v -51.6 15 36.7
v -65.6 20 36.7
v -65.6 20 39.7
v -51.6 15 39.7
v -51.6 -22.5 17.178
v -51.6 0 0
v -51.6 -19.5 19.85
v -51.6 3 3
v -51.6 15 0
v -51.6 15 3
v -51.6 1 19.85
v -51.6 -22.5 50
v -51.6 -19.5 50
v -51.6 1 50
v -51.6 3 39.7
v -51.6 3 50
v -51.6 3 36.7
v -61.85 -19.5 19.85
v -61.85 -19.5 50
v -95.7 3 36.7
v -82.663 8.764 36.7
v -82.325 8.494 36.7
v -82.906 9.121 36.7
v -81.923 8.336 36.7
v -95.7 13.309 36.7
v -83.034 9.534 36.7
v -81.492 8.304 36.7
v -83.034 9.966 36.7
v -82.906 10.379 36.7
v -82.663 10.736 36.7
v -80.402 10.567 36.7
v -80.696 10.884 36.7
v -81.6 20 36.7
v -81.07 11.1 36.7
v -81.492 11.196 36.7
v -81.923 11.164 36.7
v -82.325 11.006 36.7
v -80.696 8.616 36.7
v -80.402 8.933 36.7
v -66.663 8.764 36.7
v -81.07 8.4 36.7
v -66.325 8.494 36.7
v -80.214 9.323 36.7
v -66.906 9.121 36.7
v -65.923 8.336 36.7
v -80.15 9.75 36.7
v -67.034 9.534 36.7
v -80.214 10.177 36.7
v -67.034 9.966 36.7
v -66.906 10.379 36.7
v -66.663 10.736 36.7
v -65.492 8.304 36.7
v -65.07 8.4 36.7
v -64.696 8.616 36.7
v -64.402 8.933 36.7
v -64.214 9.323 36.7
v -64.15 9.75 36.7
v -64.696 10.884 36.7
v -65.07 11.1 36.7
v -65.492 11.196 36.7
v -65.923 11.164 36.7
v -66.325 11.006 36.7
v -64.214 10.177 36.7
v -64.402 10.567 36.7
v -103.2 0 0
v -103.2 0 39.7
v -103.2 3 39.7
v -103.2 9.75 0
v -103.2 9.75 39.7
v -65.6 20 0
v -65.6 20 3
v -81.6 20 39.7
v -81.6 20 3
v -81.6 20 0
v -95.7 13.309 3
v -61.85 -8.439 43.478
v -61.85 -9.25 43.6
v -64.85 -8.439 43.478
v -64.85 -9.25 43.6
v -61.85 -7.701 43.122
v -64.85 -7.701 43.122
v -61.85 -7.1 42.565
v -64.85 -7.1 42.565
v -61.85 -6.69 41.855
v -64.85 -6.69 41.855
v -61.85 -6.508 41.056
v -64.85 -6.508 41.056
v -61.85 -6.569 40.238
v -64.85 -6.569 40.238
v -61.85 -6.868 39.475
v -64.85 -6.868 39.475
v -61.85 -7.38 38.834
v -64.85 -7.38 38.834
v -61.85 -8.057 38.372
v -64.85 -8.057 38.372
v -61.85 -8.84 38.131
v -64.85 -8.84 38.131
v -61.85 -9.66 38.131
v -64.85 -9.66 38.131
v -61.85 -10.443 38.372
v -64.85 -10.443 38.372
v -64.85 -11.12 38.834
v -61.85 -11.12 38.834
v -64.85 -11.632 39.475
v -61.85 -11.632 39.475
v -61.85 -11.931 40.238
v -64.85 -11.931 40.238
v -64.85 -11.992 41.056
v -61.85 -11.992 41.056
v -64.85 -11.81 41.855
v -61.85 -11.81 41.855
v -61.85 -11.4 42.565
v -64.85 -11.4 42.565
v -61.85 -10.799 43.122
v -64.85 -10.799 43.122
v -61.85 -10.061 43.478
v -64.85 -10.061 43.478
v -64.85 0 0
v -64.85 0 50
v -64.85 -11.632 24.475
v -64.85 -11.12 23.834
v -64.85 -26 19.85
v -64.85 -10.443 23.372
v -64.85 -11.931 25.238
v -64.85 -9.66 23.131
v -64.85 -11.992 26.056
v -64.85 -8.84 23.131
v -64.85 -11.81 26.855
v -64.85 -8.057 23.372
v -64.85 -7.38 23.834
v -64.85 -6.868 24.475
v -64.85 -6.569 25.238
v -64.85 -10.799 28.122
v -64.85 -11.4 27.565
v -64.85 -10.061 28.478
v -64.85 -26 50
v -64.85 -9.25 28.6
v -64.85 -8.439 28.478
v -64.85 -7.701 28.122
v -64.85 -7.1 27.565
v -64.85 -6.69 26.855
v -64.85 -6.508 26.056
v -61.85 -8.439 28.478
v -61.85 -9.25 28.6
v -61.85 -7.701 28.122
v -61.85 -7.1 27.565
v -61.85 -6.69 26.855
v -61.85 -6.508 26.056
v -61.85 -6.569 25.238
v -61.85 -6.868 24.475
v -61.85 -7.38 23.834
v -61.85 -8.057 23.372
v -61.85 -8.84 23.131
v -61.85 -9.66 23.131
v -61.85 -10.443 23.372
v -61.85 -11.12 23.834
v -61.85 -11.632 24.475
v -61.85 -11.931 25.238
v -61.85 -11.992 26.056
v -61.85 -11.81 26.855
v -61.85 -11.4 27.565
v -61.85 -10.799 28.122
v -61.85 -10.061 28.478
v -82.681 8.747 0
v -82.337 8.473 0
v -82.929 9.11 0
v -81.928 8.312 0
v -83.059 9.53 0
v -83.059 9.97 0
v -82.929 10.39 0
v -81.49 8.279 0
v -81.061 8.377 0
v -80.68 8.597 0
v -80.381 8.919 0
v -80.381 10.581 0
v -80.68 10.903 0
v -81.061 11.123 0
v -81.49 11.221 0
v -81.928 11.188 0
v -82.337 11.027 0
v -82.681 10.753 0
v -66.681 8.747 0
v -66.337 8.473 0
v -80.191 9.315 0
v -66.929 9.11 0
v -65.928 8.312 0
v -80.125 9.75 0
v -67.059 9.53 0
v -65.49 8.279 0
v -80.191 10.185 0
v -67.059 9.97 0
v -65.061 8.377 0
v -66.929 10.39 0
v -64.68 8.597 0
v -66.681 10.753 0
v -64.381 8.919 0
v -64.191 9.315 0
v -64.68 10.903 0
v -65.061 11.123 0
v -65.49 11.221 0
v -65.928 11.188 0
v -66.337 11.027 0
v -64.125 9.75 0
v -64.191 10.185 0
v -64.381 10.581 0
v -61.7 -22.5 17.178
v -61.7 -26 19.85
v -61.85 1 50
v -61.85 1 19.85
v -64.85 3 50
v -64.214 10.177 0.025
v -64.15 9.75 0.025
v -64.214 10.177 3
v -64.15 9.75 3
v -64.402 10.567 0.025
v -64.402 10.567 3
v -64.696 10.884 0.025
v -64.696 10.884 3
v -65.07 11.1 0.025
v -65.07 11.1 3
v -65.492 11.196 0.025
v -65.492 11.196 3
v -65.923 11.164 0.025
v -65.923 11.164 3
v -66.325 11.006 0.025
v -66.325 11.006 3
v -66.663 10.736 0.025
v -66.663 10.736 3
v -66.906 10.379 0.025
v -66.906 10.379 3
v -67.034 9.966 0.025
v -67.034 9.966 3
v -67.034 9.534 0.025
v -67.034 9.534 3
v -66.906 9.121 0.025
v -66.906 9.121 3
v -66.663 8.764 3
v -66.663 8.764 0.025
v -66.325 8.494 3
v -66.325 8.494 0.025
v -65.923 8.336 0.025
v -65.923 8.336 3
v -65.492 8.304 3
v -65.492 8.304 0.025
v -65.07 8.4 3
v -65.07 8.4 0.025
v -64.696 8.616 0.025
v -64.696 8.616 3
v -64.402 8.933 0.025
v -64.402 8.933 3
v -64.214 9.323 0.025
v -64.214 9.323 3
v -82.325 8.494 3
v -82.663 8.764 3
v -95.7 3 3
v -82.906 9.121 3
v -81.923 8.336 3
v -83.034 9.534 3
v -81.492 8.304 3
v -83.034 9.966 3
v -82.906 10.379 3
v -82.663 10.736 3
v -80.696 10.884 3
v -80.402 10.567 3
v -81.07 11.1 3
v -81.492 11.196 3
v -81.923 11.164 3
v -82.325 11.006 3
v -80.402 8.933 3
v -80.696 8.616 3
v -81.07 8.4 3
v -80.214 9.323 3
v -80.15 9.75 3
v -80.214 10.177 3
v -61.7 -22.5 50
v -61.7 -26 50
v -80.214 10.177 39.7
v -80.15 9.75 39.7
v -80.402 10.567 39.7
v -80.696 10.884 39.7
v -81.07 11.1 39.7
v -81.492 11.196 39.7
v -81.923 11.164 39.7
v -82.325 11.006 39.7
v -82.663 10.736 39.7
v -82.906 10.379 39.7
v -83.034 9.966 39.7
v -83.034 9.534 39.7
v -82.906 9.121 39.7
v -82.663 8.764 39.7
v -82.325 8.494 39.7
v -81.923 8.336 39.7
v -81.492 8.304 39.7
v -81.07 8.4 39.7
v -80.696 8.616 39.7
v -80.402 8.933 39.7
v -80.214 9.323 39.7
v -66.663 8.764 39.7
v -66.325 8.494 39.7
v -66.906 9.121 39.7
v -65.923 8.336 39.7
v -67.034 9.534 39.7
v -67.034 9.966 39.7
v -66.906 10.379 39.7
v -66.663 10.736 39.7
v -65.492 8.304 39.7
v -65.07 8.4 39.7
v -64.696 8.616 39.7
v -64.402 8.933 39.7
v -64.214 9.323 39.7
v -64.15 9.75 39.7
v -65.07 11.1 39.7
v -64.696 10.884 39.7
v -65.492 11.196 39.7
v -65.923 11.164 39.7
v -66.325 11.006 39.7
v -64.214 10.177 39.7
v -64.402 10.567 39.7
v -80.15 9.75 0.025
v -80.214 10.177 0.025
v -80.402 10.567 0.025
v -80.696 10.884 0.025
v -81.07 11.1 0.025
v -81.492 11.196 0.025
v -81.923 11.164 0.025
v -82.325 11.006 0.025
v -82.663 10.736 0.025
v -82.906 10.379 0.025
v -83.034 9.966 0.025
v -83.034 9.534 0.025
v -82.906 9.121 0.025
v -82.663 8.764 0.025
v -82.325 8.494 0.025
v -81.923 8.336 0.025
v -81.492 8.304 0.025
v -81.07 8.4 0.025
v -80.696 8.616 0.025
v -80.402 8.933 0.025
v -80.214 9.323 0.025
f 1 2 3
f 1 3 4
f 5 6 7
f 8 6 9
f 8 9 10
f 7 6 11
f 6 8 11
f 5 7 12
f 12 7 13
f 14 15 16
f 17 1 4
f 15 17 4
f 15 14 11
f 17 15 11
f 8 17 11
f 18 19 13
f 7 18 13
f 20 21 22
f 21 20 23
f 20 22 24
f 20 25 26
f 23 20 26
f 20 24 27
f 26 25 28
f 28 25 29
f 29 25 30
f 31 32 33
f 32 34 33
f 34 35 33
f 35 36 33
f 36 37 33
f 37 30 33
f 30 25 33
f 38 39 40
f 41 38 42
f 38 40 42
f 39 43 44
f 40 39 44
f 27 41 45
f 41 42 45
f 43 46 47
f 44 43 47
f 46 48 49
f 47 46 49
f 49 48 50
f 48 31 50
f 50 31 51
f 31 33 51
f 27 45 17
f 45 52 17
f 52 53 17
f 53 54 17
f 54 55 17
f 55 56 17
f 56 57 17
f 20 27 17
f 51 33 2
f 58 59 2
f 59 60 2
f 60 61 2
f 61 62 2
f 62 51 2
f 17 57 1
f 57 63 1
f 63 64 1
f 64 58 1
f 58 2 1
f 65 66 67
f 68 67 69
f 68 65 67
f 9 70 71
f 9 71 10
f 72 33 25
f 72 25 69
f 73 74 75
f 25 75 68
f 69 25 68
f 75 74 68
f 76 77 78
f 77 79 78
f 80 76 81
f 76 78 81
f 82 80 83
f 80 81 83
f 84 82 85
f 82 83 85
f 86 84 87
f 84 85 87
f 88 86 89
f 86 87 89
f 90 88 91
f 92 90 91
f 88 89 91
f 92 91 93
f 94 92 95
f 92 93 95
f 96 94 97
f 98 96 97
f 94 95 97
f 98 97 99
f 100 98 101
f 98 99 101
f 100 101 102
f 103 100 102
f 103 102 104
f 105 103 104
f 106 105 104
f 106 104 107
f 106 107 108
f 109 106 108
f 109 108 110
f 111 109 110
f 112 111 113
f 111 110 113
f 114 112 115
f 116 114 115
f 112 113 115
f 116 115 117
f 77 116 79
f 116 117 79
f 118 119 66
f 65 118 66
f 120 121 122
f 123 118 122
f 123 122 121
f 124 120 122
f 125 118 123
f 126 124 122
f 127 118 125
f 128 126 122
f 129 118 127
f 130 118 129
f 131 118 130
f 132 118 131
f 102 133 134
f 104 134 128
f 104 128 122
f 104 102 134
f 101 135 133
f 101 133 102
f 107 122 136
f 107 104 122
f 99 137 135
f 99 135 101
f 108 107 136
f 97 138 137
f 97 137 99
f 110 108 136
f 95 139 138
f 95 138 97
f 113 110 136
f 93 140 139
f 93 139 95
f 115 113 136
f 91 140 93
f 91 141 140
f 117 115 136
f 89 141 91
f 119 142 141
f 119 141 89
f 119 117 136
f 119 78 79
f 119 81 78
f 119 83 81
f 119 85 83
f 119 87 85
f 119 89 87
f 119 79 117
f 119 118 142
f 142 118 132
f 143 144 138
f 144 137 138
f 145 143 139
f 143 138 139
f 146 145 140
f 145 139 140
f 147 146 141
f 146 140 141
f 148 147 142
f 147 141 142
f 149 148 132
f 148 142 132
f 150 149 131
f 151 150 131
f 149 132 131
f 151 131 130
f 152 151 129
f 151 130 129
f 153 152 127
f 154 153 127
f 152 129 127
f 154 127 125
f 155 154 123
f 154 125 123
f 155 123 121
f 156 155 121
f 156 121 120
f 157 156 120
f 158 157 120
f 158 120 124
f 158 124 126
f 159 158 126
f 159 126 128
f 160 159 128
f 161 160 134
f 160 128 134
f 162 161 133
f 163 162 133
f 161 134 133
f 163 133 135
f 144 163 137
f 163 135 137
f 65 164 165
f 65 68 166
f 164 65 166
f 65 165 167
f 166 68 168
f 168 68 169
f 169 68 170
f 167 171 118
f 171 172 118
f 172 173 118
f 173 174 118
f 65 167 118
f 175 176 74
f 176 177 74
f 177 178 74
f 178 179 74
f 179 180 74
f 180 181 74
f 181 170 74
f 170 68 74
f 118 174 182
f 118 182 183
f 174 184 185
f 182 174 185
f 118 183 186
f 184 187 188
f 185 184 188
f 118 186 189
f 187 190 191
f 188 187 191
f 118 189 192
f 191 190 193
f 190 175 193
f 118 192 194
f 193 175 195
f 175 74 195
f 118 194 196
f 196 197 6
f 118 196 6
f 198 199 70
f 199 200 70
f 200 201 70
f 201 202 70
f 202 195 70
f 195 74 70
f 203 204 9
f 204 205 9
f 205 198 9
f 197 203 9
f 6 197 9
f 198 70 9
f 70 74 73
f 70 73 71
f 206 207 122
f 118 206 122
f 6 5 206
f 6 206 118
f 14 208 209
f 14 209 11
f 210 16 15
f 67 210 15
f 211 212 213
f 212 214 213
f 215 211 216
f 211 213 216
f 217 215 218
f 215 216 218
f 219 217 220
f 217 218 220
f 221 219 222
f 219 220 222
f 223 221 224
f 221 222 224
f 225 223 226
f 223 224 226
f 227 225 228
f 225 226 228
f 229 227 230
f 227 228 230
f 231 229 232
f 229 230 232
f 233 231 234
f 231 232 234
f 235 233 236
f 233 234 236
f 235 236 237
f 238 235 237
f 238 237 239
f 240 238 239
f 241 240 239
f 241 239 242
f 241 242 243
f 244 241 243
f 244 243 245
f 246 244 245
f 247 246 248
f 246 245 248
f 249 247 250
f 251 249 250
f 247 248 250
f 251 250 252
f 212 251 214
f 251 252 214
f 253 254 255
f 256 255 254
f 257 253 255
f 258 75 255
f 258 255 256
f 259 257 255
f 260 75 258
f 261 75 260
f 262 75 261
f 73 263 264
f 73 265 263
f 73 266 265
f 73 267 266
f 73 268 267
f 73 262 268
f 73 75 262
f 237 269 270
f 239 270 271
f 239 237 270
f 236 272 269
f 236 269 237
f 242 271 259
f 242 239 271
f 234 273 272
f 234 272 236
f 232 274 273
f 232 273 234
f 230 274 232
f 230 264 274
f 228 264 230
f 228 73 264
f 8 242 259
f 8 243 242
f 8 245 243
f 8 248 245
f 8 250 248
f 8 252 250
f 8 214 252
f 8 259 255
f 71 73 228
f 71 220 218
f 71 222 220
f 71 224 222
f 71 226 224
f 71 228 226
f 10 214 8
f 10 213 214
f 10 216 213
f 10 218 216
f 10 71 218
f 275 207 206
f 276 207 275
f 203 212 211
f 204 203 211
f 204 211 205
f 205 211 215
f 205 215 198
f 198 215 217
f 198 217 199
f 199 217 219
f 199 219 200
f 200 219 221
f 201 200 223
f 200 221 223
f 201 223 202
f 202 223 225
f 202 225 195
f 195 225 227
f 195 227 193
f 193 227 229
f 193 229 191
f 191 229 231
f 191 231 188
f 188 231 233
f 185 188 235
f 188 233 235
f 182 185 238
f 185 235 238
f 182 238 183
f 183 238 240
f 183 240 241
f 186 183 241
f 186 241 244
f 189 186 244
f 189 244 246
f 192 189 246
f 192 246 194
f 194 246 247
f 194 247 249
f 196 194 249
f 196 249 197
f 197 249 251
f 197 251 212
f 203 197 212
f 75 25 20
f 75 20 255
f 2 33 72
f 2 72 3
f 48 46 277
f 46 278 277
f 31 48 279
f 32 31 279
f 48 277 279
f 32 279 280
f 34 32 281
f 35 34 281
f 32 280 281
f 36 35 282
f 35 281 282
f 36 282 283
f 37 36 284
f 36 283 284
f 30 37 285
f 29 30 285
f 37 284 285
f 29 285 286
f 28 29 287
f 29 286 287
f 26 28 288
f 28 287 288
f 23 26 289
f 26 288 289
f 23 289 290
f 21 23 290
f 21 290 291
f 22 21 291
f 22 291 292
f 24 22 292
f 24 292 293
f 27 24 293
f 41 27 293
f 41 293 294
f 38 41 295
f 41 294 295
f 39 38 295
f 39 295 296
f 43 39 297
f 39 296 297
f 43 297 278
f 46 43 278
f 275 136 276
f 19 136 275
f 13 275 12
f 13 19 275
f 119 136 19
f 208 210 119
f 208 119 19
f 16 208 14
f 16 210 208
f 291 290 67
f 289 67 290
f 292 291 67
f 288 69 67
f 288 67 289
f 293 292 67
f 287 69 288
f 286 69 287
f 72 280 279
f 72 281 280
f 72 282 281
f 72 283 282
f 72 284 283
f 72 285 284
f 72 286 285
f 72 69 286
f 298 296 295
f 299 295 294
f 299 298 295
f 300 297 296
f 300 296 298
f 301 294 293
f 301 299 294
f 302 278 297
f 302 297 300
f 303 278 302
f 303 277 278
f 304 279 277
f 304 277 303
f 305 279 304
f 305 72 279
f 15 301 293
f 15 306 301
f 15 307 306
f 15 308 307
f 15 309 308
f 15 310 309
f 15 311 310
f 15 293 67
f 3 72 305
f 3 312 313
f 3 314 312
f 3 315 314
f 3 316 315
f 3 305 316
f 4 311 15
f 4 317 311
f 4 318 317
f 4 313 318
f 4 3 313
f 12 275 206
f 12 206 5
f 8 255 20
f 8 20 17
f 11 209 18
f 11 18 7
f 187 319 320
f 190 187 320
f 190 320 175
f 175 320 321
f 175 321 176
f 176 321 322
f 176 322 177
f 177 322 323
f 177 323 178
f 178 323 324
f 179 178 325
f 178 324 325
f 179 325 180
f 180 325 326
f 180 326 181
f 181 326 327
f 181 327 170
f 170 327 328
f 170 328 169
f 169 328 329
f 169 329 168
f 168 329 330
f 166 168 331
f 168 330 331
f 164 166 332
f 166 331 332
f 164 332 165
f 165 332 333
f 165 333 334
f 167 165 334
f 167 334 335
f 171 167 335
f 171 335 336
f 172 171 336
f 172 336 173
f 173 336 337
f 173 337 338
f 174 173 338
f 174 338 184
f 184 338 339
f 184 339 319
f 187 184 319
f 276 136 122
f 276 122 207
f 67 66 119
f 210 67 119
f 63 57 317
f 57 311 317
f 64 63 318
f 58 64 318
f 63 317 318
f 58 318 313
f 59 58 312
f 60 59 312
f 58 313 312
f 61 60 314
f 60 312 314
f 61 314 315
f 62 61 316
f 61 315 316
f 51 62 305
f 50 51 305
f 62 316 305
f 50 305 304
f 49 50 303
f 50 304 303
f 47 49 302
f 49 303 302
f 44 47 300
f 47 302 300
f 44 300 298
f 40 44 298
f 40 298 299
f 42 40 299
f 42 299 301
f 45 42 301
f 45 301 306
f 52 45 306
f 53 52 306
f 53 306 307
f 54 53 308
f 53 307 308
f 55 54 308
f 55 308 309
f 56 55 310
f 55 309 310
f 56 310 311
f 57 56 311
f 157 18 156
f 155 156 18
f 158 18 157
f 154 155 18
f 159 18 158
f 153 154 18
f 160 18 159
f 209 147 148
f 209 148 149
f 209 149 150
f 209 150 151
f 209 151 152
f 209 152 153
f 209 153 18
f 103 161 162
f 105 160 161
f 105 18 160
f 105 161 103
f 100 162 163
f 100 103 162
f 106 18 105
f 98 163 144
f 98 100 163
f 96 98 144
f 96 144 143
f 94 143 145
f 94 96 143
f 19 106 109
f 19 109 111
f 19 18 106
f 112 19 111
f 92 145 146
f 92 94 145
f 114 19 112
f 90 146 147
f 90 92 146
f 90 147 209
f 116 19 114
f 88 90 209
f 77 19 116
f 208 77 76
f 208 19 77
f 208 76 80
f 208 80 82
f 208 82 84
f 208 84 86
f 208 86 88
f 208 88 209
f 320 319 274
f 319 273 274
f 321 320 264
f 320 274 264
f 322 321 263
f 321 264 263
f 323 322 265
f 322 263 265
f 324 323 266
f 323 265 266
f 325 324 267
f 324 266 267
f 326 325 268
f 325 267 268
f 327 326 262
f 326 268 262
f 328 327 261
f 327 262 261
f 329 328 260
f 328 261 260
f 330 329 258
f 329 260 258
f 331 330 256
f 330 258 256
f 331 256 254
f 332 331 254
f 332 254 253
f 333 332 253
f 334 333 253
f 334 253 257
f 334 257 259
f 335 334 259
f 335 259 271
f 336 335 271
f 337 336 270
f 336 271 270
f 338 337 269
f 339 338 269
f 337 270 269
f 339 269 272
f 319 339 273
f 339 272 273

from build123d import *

# Parameters (mm, degrees)
SKETCH_1_W                     = 103.2
SKETCH_1_H                     = 20
EXTRUDE_1_DEPTH                = 39.7
SKETCH_2_W                     = 88.2
SKETCH_2_H                     = 33.7
CUT_EXTRUDE_1_DEPTH            = 17
EXTRUDE_START                  = -3
SKETCH_3_W                     = 26.5
SKETCH_3_H                     = 50
EXTRUDE_2_DEPTH                = 29
SKETCH_21_W                    = 20.5
SKETCH_21_H                    = 20.5
CUT_EXTRUDE_11_DEPTH           = 30.15
SKETCH_22_W                    = 20.2
SKETCH_22_H                    = 50
CUT_EXTRUDE_12_DEPTH           = 3.5
CUT_EXTRUDE_14_DEPTH           = 65.85
EXTRUDE_4_DEPTH                = 3
HOLE_WIZARD_M2_5_1_D           = 2.9
HOLE_WIZARD_M2_5_1_CSINK_D     = 2.95
HOLE_WIZARD_M2_5_1_CSINK_ANGLE = 90
HOLE_WIZARD_M5_2_D             = 5.5
HOLE_WIZARD_M5_2_CSINK_D       = 5.55
HOLE_WIZARD_M5_2_CSINK_ANGLE   = 90
CUT_EXTRUDE_19_DEPTH           = 51
SKETCH_36_W                    = 50
SKETCH_36_H                    = 46
CUT_EXTRUDE_20_DEPTH           = 51.6


with BuildPart() as part:
    # 草图1 → 凸台-拉伸1 (new body)
    with BuildSketch(Plane.XY):
        with Locations((-51.6, 10)):
            Rectangle(SKETCH_1_W, SKETCH_1_H)
    extrude(amount=EXTRUDE_1_DEPTH)

    # 草图2 → 切除-拉伸1 (cut)
    with BuildSketch(Plane(origin=(0, 20, 0), x_dir=(1, 0, 0), z_dir=(0, 1, 0))):
        with Locations((-51.6, -19.85)):
            Rectangle(SKETCH_2_W, SKETCH_2_H)
    extrude(amount=-CUT_EXTRUDE_1_DEPTH, mode=Mode.SUBTRACT)

    # 草图3 → 凸台-拉伸2 (add)
    with BuildSketch(Plane.XZ.offset(EXTRUDE_START)):
        with Locations((-51.6, 25)):
            Rectangle(SKETCH_3_W, SKETCH_3_H)
    extrude(amount=EXTRUDE_2_DEPTH)

    # 草图21 → 切除-拉伸11 (cut)
    with BuildSketch(Plane.XY.offset(50)):
        with Locations((-51.6, -9.25)):
            Rectangle(SKETCH_21_W, SKETCH_21_H)
    extrude(amount=-CUT_EXTRUDE_11_DEPTH, mode=Mode.SUBTRACT)

    # 草图22 → 切除-拉伸12 (cut)
    with BuildSketch(Plane.XZ.offset(26)):
        with Locations((-51.6, 25)):
            Rectangle(SKETCH_22_W, SKETCH_22_H)
    extrude(amount=-CUT_EXTRUDE_12_DEPTH, mode=Mode.SUBTRACT)

    # 草图24 → 切除-拉伸14 (cut, through all)
    with BuildSketch(Plane(origin=(-38.35, 0, 0), x_dir=(0, 0, -1), z_dir=(1, 0, 0))):
        Polygon((0, 0), (0, -26), (-19.85, -26), align=None)
    extrude(amount=-CUT_EXTRUDE_14_DEPTH, mode=Mode.SUBTRACT)

    # 草图25 → 凸台-拉伸4 (add)
    with BuildSketch(Plane.XZ):
        Polygon((-38.35, 39.7), (-38.35, 50), (0, 39.7), align=None)
        Polygon((-64.85, 39.7), (-103.2, 39.7), (-64.85, 50), align=None)
    extrude(amount=-EXTRUDE_4_DEPTH)

    # M2.5 间隙孔1 (through all)
    with Locations(Plane(origin=(0, 0, 0), x_dir=(-1, 0, 0), z_dir=(0, 0, -1))):
        with Locations((81.6, 9.75), (37.6, 9.75), (21.6, 9.75), (65.6, 9.75)):
            CounterSinkHole(HOLE_WIZARD_M2_5_1_D / 2, HOLE_WIZARD_M2_5_1_CSINK_D / 2, counter_sink_angle=HOLE_WIZARD_M2_5_1_CSINK_ANGLE)

    # M5 间隙孔2 (through all)
    with Locations(Plane(origin=(-38.35, 0, 0), x_dir=(0, 0, -1), z_dir=(1, 0, 0))):
        with Locations((-40.85, -9.25), (-25.85, -9.25)):
            CounterSinkHole(HOLE_WIZARD_M5_2_D / 2, HOLE_WIZARD_M5_2_CSINK_D / 2, counter_sink_angle=HOLE_WIZARD_M5_2_CSINK_ANGLE)

    # 草图35 → 切除-拉伸19 (cut, through all)
    with BuildSketch(Plane(origin=(0, 0, 0), x_dir=(-1, 0, 0), z_dir=(0, 0, -1))):
        Polygon((103.2, 20), (81.6, 20), (103.2, 9.75), align=None)
        Polygon((0, 20), (0, 9.75), (21.6, 20), align=None)
        Polygon((65.6, 20), (51.6, 15), (37.6, 20), align=None)
    extrude(amount=-CUT_EXTRUDE_19_DEPTH, mode=Mode.SUBTRACT)

    # 草图36 → 切除-拉伸20 (cut)
    with BuildSketch(Plane.ZY.offset(51.6)):
        with Locations((25, -3)):
            Rectangle(SKETCH_36_W, SKETCH_36_H)
    extrude(amount=-CUT_EXTRUDE_20_DEPTH, mode=Mode.SUBTRACT)


solid = part.part
